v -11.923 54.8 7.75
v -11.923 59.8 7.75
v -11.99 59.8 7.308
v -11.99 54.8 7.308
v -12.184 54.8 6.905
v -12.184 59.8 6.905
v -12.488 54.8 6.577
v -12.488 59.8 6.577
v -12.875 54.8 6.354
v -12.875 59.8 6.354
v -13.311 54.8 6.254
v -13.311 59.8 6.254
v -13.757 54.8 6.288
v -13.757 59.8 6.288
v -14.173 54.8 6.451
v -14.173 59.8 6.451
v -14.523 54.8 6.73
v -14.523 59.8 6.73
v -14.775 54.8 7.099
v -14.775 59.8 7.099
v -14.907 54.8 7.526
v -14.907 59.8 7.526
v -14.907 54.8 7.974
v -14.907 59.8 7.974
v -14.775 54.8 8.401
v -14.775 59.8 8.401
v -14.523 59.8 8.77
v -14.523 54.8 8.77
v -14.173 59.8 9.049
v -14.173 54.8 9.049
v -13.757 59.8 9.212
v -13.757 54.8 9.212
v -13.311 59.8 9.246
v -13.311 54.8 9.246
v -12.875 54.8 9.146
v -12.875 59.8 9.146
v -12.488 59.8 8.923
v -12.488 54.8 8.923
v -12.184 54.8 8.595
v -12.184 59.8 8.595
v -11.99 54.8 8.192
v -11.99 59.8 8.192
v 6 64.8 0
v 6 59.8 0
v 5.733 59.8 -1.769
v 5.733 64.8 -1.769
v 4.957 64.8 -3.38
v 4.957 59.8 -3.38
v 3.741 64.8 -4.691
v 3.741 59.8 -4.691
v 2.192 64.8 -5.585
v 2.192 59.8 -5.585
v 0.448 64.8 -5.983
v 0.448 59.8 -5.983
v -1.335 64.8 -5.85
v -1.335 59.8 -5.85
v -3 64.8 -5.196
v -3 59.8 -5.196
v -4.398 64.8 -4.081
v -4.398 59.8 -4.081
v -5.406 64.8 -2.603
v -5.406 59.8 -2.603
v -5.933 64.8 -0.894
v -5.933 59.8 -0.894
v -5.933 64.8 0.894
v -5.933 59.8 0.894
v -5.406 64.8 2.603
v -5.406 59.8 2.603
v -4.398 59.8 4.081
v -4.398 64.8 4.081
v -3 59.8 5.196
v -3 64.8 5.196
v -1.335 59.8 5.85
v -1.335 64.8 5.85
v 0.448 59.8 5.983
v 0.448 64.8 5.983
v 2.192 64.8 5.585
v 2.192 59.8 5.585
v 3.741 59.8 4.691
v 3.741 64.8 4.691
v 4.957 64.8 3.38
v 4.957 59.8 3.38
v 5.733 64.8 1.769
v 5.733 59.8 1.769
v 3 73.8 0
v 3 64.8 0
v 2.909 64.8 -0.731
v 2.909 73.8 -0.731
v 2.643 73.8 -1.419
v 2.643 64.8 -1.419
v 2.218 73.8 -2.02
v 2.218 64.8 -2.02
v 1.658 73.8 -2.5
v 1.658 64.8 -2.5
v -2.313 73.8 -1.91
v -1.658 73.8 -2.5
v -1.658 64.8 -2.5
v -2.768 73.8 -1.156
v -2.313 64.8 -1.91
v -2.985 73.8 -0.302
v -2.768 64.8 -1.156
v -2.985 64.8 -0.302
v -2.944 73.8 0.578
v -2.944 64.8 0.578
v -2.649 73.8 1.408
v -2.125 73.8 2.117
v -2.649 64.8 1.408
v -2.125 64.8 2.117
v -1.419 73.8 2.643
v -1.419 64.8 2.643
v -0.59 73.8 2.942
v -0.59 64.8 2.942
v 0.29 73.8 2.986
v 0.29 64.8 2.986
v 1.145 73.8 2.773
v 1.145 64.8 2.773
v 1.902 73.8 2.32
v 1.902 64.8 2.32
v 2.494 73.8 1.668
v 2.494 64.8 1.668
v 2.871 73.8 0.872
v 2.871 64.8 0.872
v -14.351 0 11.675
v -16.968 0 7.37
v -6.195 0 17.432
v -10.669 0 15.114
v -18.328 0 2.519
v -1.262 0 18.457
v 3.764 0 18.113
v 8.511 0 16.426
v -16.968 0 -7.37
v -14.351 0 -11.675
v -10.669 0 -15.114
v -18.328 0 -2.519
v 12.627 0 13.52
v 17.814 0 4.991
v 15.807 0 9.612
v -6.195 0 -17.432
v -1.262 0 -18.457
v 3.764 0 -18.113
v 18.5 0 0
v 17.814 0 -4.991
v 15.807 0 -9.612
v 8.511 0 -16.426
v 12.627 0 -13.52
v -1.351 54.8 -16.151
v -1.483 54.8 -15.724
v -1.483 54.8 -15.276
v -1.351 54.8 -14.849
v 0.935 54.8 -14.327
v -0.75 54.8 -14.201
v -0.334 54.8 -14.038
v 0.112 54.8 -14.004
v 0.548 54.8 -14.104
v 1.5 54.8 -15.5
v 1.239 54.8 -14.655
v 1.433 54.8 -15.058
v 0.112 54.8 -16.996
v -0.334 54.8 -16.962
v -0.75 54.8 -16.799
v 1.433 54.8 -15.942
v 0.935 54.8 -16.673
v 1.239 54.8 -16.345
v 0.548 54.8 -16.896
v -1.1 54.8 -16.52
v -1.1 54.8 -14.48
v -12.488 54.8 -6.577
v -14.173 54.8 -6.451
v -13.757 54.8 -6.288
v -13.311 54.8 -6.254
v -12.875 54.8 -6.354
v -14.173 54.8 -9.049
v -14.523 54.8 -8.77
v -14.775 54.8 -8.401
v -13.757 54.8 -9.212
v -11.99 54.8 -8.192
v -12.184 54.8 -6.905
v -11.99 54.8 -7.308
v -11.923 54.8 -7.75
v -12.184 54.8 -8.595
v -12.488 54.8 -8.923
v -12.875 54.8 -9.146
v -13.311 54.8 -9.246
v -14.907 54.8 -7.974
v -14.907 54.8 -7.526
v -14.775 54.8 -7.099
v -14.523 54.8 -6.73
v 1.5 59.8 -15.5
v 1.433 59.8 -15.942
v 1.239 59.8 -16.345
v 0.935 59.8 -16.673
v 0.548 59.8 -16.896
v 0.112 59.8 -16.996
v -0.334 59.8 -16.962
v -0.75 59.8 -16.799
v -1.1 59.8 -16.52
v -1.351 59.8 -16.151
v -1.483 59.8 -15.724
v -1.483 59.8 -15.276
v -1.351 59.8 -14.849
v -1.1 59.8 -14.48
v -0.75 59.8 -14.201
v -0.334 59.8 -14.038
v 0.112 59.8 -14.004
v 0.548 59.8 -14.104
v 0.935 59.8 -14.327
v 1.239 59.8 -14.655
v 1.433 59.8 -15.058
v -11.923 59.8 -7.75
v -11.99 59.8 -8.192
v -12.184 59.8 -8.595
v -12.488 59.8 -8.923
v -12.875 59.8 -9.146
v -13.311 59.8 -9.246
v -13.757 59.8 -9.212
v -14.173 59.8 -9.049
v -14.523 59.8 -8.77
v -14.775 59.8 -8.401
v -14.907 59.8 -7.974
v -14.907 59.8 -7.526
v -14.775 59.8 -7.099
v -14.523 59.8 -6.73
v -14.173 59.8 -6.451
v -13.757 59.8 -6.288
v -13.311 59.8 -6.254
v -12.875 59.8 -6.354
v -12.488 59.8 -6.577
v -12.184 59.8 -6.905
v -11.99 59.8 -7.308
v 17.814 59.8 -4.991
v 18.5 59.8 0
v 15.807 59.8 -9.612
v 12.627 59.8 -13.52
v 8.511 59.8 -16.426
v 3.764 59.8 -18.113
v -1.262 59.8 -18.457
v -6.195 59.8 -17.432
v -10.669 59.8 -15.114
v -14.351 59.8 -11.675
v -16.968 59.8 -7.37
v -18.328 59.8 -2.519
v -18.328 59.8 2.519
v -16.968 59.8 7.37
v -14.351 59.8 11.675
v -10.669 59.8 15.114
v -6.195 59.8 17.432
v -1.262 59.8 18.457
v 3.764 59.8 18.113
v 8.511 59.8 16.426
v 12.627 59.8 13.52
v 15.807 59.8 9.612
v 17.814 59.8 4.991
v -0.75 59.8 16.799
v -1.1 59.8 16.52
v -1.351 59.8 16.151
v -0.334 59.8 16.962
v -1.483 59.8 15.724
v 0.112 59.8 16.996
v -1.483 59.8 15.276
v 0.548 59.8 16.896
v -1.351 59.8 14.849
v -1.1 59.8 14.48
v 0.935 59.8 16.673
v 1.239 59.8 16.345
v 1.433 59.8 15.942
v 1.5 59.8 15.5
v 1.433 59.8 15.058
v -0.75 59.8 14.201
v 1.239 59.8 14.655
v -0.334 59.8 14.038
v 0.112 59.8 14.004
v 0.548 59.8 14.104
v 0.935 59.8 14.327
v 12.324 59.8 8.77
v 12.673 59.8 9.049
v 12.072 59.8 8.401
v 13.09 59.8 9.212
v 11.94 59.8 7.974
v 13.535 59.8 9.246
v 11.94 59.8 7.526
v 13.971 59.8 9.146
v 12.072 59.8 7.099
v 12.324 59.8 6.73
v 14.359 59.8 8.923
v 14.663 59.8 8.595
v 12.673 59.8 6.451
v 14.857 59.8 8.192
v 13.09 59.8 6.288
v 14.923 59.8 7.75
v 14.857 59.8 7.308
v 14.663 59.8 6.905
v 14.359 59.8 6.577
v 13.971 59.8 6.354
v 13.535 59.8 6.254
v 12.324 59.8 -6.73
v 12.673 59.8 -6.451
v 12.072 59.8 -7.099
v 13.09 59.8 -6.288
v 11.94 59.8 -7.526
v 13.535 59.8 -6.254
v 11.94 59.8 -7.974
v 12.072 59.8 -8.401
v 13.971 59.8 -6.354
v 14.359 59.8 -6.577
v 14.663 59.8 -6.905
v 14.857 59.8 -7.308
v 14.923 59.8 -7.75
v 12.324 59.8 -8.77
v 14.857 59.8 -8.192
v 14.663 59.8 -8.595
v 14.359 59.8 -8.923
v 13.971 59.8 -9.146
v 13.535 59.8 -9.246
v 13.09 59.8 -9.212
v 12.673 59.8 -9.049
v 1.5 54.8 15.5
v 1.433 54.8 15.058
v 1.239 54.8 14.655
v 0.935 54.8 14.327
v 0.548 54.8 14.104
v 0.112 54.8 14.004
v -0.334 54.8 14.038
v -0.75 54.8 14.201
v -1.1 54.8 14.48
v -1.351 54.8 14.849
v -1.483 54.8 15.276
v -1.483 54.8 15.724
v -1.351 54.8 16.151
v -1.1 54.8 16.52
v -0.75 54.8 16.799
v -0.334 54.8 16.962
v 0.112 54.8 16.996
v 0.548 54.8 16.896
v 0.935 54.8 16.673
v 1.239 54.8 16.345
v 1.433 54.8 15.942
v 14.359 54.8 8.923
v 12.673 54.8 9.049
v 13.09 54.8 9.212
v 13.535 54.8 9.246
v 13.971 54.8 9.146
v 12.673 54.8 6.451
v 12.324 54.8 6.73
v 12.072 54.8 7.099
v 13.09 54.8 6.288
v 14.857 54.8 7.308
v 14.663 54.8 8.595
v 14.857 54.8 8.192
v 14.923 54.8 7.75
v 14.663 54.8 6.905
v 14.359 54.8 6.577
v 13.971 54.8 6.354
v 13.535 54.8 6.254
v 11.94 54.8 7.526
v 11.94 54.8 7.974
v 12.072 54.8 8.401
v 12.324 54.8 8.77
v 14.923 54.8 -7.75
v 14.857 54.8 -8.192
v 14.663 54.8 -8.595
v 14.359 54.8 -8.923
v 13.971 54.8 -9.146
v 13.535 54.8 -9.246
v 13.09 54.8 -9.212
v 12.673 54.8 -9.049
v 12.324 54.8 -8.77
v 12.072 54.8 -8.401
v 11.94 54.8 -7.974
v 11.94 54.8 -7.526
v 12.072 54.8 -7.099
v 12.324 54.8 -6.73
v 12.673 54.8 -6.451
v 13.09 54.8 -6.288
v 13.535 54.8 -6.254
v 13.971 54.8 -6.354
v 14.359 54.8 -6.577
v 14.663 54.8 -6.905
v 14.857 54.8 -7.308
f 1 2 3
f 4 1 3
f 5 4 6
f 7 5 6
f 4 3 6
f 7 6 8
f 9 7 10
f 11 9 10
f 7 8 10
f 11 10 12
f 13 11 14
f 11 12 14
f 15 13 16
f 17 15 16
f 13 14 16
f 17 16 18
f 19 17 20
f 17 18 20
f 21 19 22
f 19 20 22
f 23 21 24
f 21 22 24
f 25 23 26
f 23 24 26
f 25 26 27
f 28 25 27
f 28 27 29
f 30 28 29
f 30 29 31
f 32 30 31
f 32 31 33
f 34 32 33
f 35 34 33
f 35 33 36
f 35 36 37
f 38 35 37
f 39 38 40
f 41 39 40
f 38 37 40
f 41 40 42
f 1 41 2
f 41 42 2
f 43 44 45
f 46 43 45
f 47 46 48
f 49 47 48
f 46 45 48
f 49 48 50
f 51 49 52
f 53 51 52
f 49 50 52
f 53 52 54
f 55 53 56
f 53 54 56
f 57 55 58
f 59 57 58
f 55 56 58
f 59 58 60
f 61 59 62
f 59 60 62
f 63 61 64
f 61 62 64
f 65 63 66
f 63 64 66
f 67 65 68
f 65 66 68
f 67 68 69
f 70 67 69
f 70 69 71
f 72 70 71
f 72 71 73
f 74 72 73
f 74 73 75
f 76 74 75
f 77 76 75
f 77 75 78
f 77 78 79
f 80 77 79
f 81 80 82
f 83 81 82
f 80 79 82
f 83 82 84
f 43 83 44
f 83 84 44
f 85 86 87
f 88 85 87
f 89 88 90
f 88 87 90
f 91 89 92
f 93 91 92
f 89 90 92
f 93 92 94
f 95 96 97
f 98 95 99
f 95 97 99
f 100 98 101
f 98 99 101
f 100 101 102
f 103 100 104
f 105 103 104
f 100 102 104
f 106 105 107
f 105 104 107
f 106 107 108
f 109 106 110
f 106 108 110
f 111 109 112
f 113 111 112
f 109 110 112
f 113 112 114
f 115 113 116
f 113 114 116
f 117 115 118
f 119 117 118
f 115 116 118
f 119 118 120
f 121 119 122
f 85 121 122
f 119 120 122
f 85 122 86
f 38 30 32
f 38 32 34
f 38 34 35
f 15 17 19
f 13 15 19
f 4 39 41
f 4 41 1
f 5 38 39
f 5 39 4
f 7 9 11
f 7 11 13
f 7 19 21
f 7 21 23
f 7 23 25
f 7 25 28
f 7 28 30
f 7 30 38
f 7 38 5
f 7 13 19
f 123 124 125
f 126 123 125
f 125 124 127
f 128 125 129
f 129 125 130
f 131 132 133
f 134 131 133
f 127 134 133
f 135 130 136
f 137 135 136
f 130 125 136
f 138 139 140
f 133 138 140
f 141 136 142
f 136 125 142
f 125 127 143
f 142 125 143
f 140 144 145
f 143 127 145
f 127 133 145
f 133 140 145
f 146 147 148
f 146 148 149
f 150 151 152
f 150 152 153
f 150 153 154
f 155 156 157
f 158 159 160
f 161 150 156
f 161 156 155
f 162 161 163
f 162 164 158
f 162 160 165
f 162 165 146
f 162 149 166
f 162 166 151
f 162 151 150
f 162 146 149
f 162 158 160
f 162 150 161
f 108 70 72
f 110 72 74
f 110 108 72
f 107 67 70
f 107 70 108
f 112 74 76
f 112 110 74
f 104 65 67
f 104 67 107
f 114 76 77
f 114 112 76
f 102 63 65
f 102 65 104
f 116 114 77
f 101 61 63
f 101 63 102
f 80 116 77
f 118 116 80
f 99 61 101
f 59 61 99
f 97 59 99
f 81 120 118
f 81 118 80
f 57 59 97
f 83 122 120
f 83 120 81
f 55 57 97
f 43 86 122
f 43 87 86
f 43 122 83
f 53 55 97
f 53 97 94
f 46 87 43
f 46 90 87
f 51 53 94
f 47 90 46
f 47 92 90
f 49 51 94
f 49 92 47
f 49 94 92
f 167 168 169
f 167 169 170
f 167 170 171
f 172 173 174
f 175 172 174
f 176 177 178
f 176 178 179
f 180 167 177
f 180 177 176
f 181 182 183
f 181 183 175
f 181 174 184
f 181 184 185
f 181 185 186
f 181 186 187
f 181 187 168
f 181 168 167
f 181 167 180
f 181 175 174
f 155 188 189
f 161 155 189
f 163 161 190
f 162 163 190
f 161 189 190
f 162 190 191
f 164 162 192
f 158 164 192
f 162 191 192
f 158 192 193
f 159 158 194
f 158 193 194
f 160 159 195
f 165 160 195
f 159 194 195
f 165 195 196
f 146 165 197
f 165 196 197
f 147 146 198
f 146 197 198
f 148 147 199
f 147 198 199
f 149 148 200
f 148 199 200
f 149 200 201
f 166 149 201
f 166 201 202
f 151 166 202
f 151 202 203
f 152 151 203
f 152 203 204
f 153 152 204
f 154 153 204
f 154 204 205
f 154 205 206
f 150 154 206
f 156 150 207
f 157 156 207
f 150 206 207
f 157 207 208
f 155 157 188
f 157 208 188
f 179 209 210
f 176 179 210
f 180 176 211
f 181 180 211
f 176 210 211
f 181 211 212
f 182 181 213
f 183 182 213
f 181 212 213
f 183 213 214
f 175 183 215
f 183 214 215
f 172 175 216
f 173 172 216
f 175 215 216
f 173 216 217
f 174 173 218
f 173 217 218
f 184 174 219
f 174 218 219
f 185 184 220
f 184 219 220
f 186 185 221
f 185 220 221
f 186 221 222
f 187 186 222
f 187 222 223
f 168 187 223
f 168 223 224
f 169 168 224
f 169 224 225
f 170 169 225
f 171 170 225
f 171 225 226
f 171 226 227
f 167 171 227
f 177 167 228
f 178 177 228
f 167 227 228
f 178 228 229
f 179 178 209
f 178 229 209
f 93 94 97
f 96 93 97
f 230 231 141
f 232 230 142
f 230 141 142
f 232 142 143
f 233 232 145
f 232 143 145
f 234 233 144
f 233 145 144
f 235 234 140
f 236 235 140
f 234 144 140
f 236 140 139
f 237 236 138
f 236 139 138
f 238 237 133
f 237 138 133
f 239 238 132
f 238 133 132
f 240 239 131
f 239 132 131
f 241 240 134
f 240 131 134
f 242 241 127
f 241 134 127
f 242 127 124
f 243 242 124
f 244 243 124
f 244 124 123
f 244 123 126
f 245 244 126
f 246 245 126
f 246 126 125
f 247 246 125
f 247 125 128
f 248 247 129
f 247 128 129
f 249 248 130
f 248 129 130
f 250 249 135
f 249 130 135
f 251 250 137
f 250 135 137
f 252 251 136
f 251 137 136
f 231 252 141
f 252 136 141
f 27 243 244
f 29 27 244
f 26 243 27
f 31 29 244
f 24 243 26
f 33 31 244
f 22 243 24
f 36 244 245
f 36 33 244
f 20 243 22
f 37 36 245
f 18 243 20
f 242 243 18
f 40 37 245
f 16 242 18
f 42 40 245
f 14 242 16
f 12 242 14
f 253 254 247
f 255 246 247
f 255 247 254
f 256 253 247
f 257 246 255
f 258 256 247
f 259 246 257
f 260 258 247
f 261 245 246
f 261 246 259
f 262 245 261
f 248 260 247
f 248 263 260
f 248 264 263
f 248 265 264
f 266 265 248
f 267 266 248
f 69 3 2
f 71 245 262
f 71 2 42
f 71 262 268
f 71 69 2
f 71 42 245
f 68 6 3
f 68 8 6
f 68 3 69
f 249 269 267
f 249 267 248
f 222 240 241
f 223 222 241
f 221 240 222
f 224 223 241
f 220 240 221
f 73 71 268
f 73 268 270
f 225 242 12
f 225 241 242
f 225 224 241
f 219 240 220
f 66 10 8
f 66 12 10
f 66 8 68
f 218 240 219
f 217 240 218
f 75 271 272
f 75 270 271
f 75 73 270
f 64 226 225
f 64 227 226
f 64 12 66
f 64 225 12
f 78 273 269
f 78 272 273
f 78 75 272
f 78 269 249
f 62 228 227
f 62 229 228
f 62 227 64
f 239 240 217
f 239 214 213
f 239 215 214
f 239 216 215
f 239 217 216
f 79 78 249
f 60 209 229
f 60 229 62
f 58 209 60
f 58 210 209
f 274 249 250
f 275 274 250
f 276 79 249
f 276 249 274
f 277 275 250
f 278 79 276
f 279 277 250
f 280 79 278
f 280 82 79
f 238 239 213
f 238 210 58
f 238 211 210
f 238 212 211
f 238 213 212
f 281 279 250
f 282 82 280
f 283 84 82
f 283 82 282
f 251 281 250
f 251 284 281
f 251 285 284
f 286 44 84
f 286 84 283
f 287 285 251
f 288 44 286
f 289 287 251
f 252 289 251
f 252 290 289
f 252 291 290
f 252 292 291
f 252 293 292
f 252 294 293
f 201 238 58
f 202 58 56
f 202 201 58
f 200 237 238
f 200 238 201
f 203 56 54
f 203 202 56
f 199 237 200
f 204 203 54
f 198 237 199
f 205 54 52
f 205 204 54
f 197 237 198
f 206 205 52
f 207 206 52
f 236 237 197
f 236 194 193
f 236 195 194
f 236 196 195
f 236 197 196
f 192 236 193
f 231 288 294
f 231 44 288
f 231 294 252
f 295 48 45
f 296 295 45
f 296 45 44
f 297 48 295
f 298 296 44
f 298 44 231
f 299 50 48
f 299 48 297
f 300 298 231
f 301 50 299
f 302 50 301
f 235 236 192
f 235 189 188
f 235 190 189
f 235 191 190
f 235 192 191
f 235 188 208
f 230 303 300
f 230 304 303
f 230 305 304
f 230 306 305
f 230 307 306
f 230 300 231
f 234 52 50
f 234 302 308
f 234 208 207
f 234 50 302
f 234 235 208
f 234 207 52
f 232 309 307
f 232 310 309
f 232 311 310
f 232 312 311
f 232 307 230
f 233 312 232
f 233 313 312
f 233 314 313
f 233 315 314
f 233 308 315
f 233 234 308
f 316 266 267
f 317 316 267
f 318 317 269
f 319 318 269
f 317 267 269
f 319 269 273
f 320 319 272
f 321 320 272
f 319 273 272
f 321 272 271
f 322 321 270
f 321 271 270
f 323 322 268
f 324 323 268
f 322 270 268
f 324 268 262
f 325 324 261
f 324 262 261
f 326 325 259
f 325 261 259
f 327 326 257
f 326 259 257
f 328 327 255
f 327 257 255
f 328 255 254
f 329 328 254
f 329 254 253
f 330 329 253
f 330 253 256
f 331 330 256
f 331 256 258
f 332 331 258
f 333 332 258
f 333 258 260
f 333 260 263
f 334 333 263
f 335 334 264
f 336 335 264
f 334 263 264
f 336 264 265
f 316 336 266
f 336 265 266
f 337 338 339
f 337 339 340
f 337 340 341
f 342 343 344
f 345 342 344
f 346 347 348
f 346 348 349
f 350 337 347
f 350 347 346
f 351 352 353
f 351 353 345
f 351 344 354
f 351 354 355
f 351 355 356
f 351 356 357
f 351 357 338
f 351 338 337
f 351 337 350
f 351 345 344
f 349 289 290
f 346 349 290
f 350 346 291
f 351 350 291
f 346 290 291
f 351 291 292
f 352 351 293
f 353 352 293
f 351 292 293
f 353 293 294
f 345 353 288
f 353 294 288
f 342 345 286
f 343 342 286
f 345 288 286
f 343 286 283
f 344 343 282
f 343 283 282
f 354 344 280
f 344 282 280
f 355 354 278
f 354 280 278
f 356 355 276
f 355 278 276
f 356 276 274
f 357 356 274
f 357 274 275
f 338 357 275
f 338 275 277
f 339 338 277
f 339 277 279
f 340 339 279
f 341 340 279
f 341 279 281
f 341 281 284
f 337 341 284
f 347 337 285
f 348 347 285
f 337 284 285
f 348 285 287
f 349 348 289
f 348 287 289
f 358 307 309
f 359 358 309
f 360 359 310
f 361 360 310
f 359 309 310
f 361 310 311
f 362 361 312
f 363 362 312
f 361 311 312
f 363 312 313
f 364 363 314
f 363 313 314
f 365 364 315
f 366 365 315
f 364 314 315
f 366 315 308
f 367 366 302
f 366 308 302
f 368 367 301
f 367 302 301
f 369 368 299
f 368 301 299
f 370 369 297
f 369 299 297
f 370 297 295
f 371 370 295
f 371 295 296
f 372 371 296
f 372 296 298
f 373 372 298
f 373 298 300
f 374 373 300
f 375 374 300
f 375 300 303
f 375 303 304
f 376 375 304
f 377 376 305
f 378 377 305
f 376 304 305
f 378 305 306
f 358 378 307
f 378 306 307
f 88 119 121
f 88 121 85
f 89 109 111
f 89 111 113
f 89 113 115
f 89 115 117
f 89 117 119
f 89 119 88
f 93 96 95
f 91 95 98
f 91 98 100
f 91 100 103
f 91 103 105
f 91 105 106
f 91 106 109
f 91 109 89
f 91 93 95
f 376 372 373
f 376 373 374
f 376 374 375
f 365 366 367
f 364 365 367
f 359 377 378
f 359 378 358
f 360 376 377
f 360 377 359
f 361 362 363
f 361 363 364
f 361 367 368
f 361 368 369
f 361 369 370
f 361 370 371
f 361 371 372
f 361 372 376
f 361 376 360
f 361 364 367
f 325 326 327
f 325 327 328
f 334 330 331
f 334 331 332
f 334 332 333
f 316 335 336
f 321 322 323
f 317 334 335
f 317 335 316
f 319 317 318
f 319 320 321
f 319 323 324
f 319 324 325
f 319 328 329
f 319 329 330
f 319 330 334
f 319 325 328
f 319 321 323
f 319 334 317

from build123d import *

# Parameters (mm, degrees)
SKETCH1_R           = 18.5
BOSS_EXTRUDE1_DEPTH = 59.8
SKETCH2_R           = 6
BOSS_EXTRUDE2_DEPTH = 5
BOSS_EXTRUDE3_DEPTH = 14
SKETCH2_5_R         = 1.5
CUT_EXTRUDE1_DEPTH  = 5


with BuildPart() as part:
    # Sketch1 → Boss-Extrude1 (new body)
    with BuildSketch(Plane(origin=(0, 0, 0), x_dir=(1, 0, 0), z_dir=(0, 1, 0))):
        Circle(SKETCH1_R)
    extrude(amount=BOSS_EXTRUDE1_DEPTH)

    # Sketch2 → Boss-Extrude2 (add)
    with BuildSketch(Plane(origin=(0, 59.8, 0), x_dir=(1, 0, 0), z_dir=(0, 1, 0))):
        Circle(SKETCH2_R)
    extrude(amount=BOSS_EXTRUDE2_DEPTH)

    # Sketch2<3> → Boss-Extrude3 (add)
    with BuildSketch(Plane(origin=(0, 59.8, 0), x_dir=(1, 0, 0), z_dir=(0, 1, 0))):
        with BuildLine():
            Line((1.658312395, 2.5), (-1.658312395, 2.5))
            ThreePointArc((-1.658312395, 2.5), (-1.418637165, -2.643382037), (3, 0))
            ThreePointArc((3, 0), (2.643382037, 1.418637165), (1.658312395, 2.5))
        make_face()
    extrude(amount=BOSS_EXTRUDE3_DEPTH)

    # Sketch2<5> → Cut-Extrude1 (cut)
    with BuildSketch(Plane(origin=(0, 59.8, 0), x_dir=(1, 0, 0), z_dir=(0, 1, 0))):
        with Locations((0, 15.5)):
            Circle(SKETCH2_5_R)
        with Locations((13.423393759, 7.75)):
            Circle(SKETCH2_5_R)
        with Locations((13.423393759, -7.75)):
            Circle(SKETCH2_5_R)
        with Locations((0, -15.5)):
            Circle(SKETCH2_5_R)
        with Locations((-13.423393759, -7.75)):
            Circle(SKETCH2_5_R)
        with Locations((-13.423393759, 7.75)):
            Circle(SKETCH2_5_R)
    extrude(amount=-CUT_EXTRUDE1_DEPTH, mode=Mode.SUBTRACT)


solid = part.part
